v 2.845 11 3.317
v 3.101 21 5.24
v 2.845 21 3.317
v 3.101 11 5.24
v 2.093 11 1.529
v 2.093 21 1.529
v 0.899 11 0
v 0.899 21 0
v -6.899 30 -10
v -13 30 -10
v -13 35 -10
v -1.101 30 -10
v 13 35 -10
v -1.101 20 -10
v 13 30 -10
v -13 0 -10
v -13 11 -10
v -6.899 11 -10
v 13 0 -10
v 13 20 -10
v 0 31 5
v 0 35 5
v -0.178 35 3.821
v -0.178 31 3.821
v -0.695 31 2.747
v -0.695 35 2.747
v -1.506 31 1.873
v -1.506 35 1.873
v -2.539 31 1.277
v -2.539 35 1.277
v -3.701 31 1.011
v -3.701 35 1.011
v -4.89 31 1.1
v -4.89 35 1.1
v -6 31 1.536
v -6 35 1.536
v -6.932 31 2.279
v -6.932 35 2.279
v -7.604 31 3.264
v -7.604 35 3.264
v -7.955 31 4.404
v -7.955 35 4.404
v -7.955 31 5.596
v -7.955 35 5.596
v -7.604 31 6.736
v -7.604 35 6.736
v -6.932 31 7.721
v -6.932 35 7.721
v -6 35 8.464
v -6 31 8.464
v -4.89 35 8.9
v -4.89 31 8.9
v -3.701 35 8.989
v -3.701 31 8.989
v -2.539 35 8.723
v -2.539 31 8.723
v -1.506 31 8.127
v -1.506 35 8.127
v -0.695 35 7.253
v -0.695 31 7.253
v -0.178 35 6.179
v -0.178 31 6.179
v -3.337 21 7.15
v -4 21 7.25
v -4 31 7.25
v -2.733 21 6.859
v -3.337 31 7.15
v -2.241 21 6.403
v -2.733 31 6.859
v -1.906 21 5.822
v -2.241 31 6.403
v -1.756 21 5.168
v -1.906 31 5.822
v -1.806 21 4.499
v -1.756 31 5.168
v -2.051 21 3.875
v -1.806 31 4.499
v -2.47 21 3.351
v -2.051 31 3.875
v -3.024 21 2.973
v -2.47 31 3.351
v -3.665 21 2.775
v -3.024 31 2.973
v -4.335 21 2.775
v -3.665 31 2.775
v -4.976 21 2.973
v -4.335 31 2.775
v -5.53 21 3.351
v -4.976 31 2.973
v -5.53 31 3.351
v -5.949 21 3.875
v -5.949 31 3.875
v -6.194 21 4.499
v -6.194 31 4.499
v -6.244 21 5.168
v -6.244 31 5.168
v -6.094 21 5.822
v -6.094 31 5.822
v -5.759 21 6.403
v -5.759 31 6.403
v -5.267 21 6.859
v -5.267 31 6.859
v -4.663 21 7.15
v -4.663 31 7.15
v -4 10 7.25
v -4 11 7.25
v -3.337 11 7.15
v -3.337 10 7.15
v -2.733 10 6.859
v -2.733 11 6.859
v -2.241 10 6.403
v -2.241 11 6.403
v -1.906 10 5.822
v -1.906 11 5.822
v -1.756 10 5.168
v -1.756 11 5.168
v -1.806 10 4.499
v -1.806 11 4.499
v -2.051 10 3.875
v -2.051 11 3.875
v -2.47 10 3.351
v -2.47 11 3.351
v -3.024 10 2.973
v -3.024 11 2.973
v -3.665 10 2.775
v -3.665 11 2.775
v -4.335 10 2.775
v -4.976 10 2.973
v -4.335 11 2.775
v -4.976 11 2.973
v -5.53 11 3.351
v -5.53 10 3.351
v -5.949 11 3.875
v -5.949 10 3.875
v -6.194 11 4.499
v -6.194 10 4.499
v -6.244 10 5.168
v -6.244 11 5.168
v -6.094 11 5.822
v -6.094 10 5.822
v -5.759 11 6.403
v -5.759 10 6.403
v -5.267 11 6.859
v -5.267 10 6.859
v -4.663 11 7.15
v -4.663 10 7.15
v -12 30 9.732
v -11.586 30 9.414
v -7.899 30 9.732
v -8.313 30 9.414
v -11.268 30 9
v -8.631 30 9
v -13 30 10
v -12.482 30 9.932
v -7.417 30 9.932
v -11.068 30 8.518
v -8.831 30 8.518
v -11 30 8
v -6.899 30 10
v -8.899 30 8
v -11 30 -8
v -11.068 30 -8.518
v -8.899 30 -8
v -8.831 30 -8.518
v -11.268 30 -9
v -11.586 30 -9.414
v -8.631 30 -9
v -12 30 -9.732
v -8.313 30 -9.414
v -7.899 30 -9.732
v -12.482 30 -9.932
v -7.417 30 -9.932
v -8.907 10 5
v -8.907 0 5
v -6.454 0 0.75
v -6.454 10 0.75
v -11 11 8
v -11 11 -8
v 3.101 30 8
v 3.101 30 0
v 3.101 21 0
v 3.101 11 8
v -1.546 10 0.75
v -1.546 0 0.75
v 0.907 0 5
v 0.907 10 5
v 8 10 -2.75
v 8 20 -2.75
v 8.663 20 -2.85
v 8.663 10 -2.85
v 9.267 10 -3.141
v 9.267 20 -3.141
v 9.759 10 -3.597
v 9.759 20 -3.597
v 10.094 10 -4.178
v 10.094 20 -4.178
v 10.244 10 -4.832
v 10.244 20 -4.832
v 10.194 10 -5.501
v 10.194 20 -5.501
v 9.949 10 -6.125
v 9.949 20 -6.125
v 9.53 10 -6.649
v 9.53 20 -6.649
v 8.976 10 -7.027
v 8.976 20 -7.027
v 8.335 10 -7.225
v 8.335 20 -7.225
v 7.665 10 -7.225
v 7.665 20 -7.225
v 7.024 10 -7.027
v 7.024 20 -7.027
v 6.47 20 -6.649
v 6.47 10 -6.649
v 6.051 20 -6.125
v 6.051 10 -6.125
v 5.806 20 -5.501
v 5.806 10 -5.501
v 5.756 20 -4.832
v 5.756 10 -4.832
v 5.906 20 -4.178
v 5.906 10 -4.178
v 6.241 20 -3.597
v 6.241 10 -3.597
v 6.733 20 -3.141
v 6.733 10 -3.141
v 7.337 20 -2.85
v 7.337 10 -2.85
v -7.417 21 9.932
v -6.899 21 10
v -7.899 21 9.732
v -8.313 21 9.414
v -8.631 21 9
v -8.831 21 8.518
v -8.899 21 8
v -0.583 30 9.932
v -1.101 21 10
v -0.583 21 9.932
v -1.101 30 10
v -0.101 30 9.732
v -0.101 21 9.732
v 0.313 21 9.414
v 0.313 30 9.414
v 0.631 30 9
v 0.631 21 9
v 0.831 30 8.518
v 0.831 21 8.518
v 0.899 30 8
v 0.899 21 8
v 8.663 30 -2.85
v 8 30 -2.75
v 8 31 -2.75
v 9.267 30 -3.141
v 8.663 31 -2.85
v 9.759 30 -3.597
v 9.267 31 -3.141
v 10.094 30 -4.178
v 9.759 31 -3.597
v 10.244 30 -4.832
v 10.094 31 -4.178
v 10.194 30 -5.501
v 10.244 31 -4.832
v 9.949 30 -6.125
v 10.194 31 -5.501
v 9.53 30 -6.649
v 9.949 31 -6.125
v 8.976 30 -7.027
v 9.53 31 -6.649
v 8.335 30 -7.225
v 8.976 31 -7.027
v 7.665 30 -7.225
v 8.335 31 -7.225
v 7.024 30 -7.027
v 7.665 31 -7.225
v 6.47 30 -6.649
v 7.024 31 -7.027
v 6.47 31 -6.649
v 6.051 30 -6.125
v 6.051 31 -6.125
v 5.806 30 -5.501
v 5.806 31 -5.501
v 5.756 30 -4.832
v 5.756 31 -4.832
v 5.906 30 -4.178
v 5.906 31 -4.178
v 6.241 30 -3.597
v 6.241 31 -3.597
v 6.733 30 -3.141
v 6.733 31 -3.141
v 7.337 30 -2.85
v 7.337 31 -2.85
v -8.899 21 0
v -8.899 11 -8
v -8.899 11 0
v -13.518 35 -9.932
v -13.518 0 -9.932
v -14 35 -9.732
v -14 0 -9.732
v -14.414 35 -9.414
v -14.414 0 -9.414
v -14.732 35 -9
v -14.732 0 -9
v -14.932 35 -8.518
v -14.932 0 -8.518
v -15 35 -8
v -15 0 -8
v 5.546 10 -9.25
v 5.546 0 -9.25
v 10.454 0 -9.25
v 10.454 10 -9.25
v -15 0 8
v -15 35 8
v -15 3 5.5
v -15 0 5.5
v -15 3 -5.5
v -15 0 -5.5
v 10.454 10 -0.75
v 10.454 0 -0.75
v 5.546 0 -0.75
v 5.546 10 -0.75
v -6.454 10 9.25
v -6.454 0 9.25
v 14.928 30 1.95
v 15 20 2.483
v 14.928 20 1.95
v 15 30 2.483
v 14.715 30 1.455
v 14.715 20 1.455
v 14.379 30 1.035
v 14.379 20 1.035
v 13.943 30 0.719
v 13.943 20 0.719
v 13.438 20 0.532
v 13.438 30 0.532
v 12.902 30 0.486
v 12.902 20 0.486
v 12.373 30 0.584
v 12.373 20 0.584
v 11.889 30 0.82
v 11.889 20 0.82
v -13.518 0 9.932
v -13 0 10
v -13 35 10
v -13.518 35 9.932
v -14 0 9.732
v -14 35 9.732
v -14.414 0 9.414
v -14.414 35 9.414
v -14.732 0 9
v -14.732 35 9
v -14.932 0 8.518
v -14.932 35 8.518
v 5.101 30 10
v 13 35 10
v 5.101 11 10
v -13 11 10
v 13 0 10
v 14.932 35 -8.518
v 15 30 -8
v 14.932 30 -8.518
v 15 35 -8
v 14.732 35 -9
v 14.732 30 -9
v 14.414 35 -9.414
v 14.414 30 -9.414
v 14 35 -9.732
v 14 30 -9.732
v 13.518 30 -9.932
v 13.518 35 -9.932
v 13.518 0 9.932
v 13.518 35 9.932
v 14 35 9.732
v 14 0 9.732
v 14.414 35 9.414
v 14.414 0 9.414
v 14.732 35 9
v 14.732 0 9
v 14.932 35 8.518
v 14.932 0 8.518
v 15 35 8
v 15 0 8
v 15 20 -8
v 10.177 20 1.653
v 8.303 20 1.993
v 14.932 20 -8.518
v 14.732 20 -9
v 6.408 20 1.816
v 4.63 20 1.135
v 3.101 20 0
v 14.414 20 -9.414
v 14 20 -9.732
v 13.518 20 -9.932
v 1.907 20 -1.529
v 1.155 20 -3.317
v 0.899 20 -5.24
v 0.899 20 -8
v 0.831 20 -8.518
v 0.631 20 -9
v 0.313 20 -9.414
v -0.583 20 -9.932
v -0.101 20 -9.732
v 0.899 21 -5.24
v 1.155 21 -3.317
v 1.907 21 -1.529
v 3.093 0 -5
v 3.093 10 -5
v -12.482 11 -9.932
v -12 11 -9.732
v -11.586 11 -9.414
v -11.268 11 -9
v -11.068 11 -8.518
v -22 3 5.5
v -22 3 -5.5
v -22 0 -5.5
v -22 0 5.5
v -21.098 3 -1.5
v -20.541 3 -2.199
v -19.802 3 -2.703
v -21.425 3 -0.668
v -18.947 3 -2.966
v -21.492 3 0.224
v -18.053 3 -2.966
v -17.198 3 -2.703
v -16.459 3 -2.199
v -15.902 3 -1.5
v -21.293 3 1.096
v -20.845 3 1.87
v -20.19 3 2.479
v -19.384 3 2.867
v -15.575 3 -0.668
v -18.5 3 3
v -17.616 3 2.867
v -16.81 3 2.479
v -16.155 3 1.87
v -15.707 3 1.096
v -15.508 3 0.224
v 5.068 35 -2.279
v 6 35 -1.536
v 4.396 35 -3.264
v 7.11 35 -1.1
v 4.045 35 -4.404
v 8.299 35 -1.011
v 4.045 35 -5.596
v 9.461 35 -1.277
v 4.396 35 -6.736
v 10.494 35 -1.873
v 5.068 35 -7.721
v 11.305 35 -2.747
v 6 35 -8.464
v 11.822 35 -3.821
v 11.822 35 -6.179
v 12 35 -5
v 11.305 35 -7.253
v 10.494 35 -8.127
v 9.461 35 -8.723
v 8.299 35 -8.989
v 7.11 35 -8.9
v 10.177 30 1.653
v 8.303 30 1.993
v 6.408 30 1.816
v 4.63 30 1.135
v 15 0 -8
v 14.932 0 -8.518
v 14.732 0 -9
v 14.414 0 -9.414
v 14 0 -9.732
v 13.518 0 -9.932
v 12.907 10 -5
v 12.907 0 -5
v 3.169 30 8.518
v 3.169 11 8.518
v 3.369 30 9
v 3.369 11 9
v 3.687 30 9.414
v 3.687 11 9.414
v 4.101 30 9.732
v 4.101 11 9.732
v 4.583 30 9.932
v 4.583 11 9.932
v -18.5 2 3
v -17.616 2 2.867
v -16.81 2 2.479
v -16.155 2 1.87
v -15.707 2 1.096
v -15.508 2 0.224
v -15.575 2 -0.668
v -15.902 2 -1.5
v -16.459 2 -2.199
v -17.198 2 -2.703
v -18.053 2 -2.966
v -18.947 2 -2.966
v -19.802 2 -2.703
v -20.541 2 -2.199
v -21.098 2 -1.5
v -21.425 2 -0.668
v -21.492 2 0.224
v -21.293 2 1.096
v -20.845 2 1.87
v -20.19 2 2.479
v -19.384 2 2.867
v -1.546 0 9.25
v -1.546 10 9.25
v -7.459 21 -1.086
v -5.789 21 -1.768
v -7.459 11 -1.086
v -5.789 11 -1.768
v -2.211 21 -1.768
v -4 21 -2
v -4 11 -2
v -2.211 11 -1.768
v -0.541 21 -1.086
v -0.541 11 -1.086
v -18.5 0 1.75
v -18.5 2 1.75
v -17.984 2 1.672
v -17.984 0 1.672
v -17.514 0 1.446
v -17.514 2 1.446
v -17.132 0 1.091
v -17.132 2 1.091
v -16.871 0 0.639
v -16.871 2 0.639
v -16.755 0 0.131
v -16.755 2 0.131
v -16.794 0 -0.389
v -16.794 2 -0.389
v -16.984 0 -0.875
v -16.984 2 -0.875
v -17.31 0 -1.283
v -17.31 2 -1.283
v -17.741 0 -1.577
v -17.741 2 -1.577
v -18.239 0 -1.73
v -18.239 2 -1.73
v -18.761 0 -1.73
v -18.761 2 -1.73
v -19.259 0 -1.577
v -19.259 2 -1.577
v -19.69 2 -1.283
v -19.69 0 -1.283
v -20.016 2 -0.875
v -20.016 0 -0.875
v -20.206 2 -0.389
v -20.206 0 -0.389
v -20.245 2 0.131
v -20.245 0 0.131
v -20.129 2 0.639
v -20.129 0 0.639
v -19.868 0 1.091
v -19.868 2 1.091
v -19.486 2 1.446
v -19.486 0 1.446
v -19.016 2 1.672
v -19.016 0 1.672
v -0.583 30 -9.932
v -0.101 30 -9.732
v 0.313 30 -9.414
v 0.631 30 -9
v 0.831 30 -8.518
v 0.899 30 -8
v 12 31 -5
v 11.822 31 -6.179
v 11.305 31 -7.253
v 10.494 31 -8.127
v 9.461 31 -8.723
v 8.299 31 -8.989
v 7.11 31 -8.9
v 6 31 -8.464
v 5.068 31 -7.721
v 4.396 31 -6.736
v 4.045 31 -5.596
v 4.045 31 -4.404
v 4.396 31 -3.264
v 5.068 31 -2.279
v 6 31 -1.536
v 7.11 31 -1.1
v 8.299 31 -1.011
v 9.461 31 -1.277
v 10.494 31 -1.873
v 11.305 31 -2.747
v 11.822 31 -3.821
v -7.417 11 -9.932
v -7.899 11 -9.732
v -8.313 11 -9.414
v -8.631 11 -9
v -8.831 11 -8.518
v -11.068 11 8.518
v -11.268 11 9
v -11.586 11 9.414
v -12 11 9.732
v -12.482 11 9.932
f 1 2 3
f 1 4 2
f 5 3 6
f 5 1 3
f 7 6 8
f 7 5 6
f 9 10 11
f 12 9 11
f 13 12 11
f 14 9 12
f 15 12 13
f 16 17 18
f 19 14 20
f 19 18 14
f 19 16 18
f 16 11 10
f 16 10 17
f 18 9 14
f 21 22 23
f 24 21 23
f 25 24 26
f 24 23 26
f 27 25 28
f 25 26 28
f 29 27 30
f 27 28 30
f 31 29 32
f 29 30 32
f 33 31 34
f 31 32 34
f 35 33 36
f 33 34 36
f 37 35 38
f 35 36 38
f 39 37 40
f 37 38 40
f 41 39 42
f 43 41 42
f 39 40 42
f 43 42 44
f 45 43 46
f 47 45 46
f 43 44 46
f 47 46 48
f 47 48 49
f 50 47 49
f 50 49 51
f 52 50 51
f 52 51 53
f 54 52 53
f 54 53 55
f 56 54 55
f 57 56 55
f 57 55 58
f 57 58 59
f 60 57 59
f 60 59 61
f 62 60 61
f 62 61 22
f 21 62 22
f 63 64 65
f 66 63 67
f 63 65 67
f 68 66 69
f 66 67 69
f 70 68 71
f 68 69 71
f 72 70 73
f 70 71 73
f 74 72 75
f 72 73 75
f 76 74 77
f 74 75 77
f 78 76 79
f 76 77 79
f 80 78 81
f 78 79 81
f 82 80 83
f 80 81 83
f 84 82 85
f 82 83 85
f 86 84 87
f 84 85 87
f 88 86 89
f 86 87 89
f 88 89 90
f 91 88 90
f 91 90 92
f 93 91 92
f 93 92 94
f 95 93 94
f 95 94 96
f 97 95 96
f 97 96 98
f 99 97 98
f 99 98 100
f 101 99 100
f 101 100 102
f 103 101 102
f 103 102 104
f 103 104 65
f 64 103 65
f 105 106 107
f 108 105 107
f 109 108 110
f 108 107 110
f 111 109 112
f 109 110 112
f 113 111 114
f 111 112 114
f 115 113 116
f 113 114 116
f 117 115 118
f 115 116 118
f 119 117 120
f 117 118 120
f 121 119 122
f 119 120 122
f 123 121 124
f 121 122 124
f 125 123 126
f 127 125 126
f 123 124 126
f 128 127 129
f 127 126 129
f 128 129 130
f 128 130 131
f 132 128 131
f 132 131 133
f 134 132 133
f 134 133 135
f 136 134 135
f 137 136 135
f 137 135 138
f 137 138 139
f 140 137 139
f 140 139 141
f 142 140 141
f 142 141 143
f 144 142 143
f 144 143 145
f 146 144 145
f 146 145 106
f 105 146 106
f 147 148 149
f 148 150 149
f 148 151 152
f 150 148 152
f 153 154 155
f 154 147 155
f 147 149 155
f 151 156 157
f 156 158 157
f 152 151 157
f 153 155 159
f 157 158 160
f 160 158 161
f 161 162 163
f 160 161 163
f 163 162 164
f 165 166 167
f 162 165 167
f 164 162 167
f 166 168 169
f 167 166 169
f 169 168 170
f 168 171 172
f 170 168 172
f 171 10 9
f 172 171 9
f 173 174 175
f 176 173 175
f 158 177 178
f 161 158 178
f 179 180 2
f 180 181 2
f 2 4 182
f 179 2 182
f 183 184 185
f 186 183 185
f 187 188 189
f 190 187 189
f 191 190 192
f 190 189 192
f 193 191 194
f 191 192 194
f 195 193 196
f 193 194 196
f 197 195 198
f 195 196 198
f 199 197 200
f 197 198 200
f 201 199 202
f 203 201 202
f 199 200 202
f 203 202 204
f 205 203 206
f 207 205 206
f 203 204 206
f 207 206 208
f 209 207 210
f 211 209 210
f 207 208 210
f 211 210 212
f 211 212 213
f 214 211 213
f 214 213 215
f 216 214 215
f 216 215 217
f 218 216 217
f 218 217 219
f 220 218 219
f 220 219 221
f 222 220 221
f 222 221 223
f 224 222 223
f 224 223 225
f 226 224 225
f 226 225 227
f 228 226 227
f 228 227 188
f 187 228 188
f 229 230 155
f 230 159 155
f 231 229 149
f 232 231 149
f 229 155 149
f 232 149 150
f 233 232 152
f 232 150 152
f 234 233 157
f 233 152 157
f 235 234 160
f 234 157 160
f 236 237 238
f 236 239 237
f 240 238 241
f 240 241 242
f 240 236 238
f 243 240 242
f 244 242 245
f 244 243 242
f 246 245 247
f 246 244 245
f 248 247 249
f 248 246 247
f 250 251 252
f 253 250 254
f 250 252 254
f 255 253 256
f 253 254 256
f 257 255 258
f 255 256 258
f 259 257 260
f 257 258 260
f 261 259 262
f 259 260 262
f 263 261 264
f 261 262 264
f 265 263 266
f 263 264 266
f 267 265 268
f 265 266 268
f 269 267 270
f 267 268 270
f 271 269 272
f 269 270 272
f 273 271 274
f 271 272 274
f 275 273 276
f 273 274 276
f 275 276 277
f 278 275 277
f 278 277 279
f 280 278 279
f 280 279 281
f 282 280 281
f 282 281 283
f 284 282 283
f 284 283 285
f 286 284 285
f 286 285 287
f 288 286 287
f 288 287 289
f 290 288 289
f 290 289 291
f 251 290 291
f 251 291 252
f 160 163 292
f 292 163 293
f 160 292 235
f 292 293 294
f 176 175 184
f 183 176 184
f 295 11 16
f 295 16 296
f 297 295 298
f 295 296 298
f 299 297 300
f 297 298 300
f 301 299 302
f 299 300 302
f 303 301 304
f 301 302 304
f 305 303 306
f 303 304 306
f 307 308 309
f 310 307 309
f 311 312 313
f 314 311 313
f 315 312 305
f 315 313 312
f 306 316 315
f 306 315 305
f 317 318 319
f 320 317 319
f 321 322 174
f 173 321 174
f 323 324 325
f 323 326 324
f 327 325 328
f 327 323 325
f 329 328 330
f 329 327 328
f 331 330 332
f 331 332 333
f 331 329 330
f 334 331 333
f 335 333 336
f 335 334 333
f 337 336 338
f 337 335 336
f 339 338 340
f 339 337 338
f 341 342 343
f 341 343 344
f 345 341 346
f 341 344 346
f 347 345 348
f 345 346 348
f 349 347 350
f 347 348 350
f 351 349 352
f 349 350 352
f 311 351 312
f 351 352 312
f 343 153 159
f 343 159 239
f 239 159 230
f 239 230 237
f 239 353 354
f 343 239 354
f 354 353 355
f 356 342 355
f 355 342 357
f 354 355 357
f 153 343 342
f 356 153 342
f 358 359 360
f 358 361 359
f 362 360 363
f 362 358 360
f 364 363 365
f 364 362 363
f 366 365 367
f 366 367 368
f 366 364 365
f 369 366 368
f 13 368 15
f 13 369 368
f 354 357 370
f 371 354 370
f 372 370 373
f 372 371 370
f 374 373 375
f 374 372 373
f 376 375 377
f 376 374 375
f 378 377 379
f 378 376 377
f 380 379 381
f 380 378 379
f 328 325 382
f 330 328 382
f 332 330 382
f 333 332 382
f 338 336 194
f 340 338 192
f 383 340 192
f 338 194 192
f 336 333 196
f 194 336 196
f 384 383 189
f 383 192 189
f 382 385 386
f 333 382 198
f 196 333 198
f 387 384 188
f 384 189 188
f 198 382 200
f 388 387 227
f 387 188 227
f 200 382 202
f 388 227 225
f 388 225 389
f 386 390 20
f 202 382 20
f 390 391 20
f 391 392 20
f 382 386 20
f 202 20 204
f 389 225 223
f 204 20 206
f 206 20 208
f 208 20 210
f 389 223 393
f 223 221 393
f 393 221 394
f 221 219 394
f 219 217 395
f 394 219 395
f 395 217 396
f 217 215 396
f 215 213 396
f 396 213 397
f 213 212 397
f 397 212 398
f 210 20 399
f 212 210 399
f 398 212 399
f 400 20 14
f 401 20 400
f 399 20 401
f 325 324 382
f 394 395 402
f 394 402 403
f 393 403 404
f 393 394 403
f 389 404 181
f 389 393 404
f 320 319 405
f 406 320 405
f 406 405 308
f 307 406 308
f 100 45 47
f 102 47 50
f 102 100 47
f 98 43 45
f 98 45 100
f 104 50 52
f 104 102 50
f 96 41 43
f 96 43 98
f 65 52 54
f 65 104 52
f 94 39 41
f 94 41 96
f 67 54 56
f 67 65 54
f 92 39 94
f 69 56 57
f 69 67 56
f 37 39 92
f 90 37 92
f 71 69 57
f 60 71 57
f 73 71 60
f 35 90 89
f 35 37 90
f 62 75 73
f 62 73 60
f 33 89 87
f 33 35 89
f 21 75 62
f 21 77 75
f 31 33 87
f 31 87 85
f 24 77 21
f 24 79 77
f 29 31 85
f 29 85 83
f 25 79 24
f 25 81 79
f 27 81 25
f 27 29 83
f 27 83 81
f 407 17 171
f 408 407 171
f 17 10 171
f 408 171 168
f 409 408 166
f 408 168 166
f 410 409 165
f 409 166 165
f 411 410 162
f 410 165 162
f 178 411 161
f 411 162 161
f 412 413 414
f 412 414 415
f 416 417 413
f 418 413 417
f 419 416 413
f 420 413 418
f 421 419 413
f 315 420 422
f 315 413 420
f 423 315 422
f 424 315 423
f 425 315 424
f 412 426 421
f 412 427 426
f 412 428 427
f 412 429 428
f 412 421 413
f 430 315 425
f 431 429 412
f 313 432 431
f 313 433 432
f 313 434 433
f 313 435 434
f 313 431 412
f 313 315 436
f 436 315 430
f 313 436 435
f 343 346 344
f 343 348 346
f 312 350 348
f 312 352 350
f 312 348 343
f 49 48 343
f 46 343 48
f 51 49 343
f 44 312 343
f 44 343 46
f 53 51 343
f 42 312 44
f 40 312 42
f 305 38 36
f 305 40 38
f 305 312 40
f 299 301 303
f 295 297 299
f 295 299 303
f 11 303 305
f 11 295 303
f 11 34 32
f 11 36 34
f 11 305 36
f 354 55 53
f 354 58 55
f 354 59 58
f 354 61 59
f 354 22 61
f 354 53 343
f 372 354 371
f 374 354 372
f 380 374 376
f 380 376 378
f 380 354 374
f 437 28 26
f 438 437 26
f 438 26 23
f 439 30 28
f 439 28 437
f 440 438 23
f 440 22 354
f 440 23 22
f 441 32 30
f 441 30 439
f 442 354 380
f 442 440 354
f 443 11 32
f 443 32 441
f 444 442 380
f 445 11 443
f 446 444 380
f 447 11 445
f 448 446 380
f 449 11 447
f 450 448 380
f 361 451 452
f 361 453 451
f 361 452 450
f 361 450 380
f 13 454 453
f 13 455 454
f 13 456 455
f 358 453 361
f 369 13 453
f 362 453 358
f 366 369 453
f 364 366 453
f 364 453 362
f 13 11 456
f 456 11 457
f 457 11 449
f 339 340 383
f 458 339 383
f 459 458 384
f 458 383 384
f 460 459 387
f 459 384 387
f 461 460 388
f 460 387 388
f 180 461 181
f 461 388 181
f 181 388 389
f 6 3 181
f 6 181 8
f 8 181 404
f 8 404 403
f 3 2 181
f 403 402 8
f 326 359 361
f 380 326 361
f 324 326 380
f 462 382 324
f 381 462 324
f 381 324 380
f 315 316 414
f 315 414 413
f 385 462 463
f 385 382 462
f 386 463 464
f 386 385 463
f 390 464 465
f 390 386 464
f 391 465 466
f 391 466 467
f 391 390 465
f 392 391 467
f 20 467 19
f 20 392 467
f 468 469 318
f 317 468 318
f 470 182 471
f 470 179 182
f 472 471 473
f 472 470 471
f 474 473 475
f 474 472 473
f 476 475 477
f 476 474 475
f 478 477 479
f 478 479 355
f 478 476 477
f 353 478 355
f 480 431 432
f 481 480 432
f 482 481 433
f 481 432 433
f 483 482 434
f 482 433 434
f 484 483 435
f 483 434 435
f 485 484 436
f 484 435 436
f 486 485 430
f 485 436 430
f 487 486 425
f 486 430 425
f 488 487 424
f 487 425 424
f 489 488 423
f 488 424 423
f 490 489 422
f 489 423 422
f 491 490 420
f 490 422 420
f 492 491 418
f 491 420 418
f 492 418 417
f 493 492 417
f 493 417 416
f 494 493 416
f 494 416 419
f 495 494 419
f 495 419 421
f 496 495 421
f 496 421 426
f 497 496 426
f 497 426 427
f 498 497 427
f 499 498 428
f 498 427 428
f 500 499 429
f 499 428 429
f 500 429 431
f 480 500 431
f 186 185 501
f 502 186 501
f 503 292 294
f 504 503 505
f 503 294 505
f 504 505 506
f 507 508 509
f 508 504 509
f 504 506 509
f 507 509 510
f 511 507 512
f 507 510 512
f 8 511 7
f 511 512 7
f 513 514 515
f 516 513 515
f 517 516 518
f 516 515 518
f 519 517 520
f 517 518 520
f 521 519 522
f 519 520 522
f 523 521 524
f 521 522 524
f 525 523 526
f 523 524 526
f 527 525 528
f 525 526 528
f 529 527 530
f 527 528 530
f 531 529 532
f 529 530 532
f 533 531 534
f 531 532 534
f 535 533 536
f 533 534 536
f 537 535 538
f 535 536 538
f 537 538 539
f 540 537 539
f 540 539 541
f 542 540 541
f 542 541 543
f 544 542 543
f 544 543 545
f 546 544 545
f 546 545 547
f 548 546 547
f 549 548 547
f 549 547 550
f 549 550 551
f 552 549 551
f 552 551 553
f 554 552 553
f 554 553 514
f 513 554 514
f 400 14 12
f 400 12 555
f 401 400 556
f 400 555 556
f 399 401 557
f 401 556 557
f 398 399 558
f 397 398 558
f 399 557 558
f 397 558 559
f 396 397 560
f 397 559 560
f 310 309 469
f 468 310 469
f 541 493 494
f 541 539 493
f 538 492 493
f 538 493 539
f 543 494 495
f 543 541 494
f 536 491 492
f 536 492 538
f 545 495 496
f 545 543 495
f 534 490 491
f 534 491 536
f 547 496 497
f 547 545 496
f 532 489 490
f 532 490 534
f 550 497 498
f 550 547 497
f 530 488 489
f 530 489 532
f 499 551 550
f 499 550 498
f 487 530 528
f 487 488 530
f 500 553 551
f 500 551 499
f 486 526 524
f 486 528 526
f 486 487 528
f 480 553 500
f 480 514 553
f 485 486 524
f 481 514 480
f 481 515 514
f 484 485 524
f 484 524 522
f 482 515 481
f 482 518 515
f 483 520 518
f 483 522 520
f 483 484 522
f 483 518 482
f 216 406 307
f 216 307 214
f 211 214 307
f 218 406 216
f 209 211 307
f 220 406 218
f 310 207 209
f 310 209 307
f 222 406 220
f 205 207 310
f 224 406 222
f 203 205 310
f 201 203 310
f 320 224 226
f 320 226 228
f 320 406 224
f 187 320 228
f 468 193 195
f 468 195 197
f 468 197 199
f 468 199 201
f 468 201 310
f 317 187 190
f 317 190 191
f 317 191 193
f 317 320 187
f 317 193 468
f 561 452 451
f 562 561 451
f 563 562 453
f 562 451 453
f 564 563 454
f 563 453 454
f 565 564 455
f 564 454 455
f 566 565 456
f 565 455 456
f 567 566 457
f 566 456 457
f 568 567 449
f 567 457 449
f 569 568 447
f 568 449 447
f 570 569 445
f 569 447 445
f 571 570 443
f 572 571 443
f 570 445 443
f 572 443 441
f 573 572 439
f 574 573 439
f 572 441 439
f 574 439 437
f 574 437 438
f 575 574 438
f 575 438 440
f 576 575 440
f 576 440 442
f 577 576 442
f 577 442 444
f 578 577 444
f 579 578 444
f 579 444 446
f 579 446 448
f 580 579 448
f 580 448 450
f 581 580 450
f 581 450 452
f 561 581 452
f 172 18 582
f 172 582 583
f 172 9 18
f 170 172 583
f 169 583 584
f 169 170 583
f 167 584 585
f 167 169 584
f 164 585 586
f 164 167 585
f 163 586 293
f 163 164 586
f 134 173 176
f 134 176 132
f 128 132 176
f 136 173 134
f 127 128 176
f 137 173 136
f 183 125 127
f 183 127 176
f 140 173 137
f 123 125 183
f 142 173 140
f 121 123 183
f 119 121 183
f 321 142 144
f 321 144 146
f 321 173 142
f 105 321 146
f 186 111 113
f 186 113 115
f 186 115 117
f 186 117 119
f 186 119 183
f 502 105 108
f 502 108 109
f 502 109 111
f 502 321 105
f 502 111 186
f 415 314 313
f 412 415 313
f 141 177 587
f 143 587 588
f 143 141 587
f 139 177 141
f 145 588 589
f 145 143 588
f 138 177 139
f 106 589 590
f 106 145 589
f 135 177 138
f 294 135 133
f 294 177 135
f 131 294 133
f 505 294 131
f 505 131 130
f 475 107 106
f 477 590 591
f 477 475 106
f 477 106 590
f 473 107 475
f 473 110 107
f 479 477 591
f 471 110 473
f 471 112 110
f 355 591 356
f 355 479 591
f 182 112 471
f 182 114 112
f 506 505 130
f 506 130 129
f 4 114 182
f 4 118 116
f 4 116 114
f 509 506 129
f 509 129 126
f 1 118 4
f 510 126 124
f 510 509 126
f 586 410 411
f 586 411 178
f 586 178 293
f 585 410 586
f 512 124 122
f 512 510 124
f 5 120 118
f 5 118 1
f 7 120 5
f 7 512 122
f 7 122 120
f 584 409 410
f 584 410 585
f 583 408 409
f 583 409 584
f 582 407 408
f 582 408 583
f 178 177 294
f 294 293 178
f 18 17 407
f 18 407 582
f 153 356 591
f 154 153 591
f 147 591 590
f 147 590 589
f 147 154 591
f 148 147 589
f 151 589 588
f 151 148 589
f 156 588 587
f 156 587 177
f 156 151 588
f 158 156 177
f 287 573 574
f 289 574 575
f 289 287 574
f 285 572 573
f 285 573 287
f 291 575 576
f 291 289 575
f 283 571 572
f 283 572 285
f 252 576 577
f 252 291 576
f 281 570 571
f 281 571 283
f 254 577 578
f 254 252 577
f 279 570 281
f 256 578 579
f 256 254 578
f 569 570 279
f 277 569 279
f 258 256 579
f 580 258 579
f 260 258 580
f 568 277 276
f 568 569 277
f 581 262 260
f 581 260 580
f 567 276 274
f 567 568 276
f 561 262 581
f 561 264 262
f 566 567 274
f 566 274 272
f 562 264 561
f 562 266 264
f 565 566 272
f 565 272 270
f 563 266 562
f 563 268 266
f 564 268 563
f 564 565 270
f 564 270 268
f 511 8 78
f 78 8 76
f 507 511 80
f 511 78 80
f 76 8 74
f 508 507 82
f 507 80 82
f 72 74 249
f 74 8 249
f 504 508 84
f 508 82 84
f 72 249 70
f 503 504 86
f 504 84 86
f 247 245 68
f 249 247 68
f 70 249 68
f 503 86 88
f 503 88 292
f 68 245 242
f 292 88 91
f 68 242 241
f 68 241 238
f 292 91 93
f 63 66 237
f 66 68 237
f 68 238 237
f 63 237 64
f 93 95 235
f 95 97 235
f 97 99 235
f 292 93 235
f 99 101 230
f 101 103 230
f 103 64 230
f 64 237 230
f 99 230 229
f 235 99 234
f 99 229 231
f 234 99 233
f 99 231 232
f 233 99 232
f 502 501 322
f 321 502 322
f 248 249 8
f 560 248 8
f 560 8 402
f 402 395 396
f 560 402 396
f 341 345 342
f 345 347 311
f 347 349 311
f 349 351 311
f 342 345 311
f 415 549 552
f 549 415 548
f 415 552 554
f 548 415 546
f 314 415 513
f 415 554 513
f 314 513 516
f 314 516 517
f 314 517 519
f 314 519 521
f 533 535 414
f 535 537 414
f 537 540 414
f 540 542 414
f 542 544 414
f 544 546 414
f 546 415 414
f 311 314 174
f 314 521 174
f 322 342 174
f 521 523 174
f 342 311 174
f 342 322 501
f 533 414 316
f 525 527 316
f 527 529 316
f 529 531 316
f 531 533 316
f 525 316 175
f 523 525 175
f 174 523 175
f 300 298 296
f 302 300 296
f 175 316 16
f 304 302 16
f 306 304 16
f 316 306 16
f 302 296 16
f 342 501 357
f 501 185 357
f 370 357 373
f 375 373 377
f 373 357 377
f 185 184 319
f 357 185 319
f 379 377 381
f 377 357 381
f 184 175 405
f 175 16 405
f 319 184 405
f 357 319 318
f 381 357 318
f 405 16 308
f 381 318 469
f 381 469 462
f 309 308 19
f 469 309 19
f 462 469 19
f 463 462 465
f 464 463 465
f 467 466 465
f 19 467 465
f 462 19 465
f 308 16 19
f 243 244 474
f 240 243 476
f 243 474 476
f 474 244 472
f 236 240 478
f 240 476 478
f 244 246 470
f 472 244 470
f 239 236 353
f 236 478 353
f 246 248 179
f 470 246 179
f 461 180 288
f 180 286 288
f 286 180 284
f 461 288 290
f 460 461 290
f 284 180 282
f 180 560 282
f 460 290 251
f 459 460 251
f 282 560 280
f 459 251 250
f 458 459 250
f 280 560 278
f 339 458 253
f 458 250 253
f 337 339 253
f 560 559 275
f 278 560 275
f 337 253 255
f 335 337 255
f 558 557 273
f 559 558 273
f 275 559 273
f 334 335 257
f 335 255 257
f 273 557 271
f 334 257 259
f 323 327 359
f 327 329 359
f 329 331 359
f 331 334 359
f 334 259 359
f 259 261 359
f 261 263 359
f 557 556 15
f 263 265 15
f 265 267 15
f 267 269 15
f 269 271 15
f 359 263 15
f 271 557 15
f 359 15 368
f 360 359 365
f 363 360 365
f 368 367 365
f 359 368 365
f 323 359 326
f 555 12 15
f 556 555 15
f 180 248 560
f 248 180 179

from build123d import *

# Parameters (mm, degrees)
SKETCH1_W                                           = 30
SKETCH1_H                                           = 20
BOSS_EXTRUDE1_DEPTH                                 = 11
SKETCH2_W                                           = 4
SKETCH2_H                                           = 20
BOSS_EXTRUDE2_DEPTH                                 = 19
SKETCH3_W                                           = 30
SKETCH3_H                                           = 20
BOSS_EXTRUDE3_DEPTH                                 = 5
BOSS_EXTRUDE4_START                                 = 9
BOSS_EXTRUDE4_DEPTH                                 = 9
BOSS_EXTRUDE5_DEPTH                                 = 9
BOSS_EXTRUDE6_DEPTH                                 = 1
FILLET1_R                                           = 2
SKETCH7_R                                           = 2.25
CUT_EXTRUDE1_DEPTH                                  = 40.37003937
CBORE_FOR_M4_HEX_SOCKET_HEAD_CAP_SCREW2_D           = 4.5
CBORE_FOR_M4_HEX_SOCKET_HEAD_CAP_SCREW2_CBORE_D     = 8
CBORE_FOR_M4_HEX_SOCKET_HEAD_CAP_SCREW2_CBORE_DEPTH = 4
CUT_EXTRUDE4_DEPTH                                  = 10
SKETCH23_W                                          = 11
SKETCH23_H                                          = 3
BOSS_EXTRUDE10_DEPTH                                = 7
SKETCH24_R                                          = 1.75
CUT_EXTRUDE7_DEPTH                                  = 7
SKETCH25_R                                          = 3
CUT_EXTRUDE8_DEPTH                                  = 1
FILLET2_R                                           = 2


with BuildPart() as part:
    # Sketch1 → Boss-Extrude1 (new body)
    with BuildSketch(Plane(origin=(0, 0, 0), x_dir=(1, 0, 0), z_dir=(0, 1, 0))):
        Rectangle(SKETCH1_W, SKETCH1_H)
    extrude(amount=BOSS_EXTRUDE1_DEPTH)

    # Sketch2 → Boss-Extrude2 (add)
    with BuildSketch(Plane(origin=(0, 11, 0), x_dir=(1, 0, 0), z_dir=(0, 1, 0))):
        with Locations((-13, 0)):
            Rectangle(SKETCH2_W, SKETCH2_H)
        with BuildLine():
            Line((0.898979486, 10), (-8.898979486, 10))
            Line((-8.898979486, 10), (-8.898979486, 0))
            ThreePointArc((-8.898979486, 0), (-4, 2), (0.898979486, 0))
            Line((0.898979486, 0), (0.898979486, 10))
        make_face()
        with BuildLine():
            Line((3.101020514, 0), (3.101020514, -10))
            Line((3.101020514, -10), (15, -10))
            Line((15, -10), (15, 5))
            ThreePointArc((15, 5), (10.711747002, -1.453404388), (3.101020514, 0))
        make_face()
    extrude(amount=BOSS_EXTRUDE2_DEPTH)

    # Sketch3 → Boss-Extrude3 (add)
    with BuildSketch(Plane(origin=(0, 30, 0), x_dir=(1, 0, 0), z_dir=(0, 1, 0))):
        Rectangle(SKETCH3_W, SKETCH3_H)
    extrude(amount=BOSS_EXTRUDE3_DEPTH)

    # Sketch4 → Boss-Extrude4 (add)
    with BuildSketch(Plane.XZ.offset(-30).offset(BOSS_EXTRUDE4_START)):
        with BuildLine():
            Line((-8.898979486, 0), (-8.898979486, 10))
            Line((-8.898979486, 10), (0.898979486, 10))
            Line((0.898979486, 10), (0.898979486, 0))
            ThreePointArc((0.898979486, 0), (-4, -2), (-8.898979486, 0))
        make_face()
    extrude(amount=-BOSS_EXTRUDE4_DEPTH)

    # Sketch5 → Boss-Extrude5 (add)
    with BuildSketch(Plane(origin=(0, 11, 0), x_dir=(1, 0, 0), z_dir=(0, 1, 0))):
        with BuildLine():
            Line((15, 10), (15, 5))
            ThreePointArc((15, 5), (10.711747002, -1.453404388), (3.101020514, 0))
            Line((3.101020514, 0), (3.101020514, -5.240408206))
            ThreePointArc((3.101020514, -5.240408206), (2.528143689, -2.398275958), (0.898979486, 0))
            Line((0.898979486, 0), (0.898979486, 10))
            Line((0.898979486, 10), (15, 10))
        make_face()
    extrude(amount=BOSS_EXTRUDE5_DEPTH)

    # Sketch6 → Boss-Extrude6 (add)
    with BuildSketch(Plane(origin=(0, 20, 0), x_dir=(1, 0, 0), z_dir=(0, 1, 0))):
        with BuildLine():
            Line((3.101020514, 0), (3.101020514, -5.240408206))
            ThreePointArc((3.101020514, -5.240408206), (2.528143689, -2.398275958), (0.898979486, 0))
            Line((0.898979486, 0), (0.898979486, 5.240408206))
            ThreePointArc((0.898979486, 5.240408206), (1.471856311, 2.398275958), (3.101020514, 0))
        make_face()
    extrude(amount=BOSS_EXTRUDE6_DEPTH)

    # Fillet1
    fillet1_edges = [part.edges().sort_by_distance(p)[0] for p in [
        (-11, 20.5, 10),
        (-11, 20.5, -10),
        (0.898979486, 25, -10),
        (-8.898979486, 20.5, -10),
        (15, 25, -5),
        (3.101020514, 20.5, 10),
        (0.898979486, 25.5, 10),
        (-8.898979486, 25.5, 10),
    ]]
    fillet(fillet1_edges, radius=FILLET1_R)

    # Sketch7 → Cut-Extrude1 (cut, through all)
    with BuildSketch(Plane(origin=(0, 35, 0), x_dir=(1, 0, 0), z_dir=(0, 1, 0))):
        with Locations(Location((-4, -5, 0), (0, 0, 270))):
            Circle(SKETCH7_R)
        with Locations(Location((8, 5, 0), (0, 0, 270))):
            Circle(SKETCH7_R)
    extrude(amount=-CUT_EXTRUDE1_DEPTH, mode=Mode.SUBTRACT)

    # CBORE for M4 Hex Socket Head Cap Screw2 (through all)
    with Locations(Plane(origin=(0, 35, 0), x_dir=(1, 0, 0), z_dir=(0, 1, 0))):
        with Locations((-4, -5), (8, 5)):
            CounterBoreHole(CBORE_FOR_M4_HEX_SOCKET_HEAD_CAP_SCREW2_D / 2, CBORE_FOR_M4_HEX_SOCKET_HEAD_CAP_SCREW2_CBORE_D / 2, CBORE_FOR_M4_HEX_SOCKET_HEAD_CAP_SCREW2_CBORE_DEPTH)

    # Sketch12 → Cut-Extrude4 (cut)
    with BuildSketch(Plane.XZ):
        Polygon((0.907477288, 5), (-1.546261356, 9.25), (-6.453738644, 9.25), (-8.907477288, 5), (-6.453738644, 0.75), (-1.546261356, 0.75), align=None)
        Polygon((3.092522712, -5), (5.546261356, -9.25), (10.453738644, -9.25), (12.907477288, -5), (10.453738644, -0.75), (5.546261356, -0.75), align=None)
    extrude(amount=-CUT_EXTRUDE4_DEPTH, mode=Mode.SUBTRACT)

    # Sketch23 → Boss-Extrude10 (add)
    with BuildSketch(Plane.ZY.offset(15)):
        with Locations((0, 1.5)):
            Rectangle(SKETCH23_W, SKETCH23_H)
    extrude(amount=BOSS_EXTRUDE10_DEPTH)

    # Sketch24 → Cut-Extrude7 (cut)
    with BuildSketch(Plane(origin=(0, 3, 0), x_dir=(1, 0, 0), z_dir=(0, 1, 0))):
        with Locations(Location((-18.5, 0, 0), (0, 0, 270))):
            Circle(SKETCH24_R)
    extrude(amount=-CUT_EXTRUDE7_DEPTH, mode=Mode.SUBTRACT)

    # Sketch25 → Cut-Extrude8 (cut)
    with BuildSketch(Plane(origin=(0, 3, 0), x_dir=(1, 0, 0), z_dir=(0, 1, 0))):
        with Locations(Location((-18.5, 0, 0), (0, 0, 270))):
            Circle(SKETCH25_R)
    extrude(amount=-CUT_EXTRUDE8_DEPTH, mode=Mode.SUBTRACT)

    # Fillet2
    fillet2_edges = [part.edges().sort_by_distance(p)[0] for p in [
        (15, 32.5, -10),
        (15, 17.5, 10),
        (-15, 17.5, 10),
        (-15, 17.5, -10),
        (15, 10, -10),
    ]]
    fillet(fillet2_edges, radius=FILLET2_R - 0.0001)  # a hair under: the kernel refuses the full size


solid = part.part
